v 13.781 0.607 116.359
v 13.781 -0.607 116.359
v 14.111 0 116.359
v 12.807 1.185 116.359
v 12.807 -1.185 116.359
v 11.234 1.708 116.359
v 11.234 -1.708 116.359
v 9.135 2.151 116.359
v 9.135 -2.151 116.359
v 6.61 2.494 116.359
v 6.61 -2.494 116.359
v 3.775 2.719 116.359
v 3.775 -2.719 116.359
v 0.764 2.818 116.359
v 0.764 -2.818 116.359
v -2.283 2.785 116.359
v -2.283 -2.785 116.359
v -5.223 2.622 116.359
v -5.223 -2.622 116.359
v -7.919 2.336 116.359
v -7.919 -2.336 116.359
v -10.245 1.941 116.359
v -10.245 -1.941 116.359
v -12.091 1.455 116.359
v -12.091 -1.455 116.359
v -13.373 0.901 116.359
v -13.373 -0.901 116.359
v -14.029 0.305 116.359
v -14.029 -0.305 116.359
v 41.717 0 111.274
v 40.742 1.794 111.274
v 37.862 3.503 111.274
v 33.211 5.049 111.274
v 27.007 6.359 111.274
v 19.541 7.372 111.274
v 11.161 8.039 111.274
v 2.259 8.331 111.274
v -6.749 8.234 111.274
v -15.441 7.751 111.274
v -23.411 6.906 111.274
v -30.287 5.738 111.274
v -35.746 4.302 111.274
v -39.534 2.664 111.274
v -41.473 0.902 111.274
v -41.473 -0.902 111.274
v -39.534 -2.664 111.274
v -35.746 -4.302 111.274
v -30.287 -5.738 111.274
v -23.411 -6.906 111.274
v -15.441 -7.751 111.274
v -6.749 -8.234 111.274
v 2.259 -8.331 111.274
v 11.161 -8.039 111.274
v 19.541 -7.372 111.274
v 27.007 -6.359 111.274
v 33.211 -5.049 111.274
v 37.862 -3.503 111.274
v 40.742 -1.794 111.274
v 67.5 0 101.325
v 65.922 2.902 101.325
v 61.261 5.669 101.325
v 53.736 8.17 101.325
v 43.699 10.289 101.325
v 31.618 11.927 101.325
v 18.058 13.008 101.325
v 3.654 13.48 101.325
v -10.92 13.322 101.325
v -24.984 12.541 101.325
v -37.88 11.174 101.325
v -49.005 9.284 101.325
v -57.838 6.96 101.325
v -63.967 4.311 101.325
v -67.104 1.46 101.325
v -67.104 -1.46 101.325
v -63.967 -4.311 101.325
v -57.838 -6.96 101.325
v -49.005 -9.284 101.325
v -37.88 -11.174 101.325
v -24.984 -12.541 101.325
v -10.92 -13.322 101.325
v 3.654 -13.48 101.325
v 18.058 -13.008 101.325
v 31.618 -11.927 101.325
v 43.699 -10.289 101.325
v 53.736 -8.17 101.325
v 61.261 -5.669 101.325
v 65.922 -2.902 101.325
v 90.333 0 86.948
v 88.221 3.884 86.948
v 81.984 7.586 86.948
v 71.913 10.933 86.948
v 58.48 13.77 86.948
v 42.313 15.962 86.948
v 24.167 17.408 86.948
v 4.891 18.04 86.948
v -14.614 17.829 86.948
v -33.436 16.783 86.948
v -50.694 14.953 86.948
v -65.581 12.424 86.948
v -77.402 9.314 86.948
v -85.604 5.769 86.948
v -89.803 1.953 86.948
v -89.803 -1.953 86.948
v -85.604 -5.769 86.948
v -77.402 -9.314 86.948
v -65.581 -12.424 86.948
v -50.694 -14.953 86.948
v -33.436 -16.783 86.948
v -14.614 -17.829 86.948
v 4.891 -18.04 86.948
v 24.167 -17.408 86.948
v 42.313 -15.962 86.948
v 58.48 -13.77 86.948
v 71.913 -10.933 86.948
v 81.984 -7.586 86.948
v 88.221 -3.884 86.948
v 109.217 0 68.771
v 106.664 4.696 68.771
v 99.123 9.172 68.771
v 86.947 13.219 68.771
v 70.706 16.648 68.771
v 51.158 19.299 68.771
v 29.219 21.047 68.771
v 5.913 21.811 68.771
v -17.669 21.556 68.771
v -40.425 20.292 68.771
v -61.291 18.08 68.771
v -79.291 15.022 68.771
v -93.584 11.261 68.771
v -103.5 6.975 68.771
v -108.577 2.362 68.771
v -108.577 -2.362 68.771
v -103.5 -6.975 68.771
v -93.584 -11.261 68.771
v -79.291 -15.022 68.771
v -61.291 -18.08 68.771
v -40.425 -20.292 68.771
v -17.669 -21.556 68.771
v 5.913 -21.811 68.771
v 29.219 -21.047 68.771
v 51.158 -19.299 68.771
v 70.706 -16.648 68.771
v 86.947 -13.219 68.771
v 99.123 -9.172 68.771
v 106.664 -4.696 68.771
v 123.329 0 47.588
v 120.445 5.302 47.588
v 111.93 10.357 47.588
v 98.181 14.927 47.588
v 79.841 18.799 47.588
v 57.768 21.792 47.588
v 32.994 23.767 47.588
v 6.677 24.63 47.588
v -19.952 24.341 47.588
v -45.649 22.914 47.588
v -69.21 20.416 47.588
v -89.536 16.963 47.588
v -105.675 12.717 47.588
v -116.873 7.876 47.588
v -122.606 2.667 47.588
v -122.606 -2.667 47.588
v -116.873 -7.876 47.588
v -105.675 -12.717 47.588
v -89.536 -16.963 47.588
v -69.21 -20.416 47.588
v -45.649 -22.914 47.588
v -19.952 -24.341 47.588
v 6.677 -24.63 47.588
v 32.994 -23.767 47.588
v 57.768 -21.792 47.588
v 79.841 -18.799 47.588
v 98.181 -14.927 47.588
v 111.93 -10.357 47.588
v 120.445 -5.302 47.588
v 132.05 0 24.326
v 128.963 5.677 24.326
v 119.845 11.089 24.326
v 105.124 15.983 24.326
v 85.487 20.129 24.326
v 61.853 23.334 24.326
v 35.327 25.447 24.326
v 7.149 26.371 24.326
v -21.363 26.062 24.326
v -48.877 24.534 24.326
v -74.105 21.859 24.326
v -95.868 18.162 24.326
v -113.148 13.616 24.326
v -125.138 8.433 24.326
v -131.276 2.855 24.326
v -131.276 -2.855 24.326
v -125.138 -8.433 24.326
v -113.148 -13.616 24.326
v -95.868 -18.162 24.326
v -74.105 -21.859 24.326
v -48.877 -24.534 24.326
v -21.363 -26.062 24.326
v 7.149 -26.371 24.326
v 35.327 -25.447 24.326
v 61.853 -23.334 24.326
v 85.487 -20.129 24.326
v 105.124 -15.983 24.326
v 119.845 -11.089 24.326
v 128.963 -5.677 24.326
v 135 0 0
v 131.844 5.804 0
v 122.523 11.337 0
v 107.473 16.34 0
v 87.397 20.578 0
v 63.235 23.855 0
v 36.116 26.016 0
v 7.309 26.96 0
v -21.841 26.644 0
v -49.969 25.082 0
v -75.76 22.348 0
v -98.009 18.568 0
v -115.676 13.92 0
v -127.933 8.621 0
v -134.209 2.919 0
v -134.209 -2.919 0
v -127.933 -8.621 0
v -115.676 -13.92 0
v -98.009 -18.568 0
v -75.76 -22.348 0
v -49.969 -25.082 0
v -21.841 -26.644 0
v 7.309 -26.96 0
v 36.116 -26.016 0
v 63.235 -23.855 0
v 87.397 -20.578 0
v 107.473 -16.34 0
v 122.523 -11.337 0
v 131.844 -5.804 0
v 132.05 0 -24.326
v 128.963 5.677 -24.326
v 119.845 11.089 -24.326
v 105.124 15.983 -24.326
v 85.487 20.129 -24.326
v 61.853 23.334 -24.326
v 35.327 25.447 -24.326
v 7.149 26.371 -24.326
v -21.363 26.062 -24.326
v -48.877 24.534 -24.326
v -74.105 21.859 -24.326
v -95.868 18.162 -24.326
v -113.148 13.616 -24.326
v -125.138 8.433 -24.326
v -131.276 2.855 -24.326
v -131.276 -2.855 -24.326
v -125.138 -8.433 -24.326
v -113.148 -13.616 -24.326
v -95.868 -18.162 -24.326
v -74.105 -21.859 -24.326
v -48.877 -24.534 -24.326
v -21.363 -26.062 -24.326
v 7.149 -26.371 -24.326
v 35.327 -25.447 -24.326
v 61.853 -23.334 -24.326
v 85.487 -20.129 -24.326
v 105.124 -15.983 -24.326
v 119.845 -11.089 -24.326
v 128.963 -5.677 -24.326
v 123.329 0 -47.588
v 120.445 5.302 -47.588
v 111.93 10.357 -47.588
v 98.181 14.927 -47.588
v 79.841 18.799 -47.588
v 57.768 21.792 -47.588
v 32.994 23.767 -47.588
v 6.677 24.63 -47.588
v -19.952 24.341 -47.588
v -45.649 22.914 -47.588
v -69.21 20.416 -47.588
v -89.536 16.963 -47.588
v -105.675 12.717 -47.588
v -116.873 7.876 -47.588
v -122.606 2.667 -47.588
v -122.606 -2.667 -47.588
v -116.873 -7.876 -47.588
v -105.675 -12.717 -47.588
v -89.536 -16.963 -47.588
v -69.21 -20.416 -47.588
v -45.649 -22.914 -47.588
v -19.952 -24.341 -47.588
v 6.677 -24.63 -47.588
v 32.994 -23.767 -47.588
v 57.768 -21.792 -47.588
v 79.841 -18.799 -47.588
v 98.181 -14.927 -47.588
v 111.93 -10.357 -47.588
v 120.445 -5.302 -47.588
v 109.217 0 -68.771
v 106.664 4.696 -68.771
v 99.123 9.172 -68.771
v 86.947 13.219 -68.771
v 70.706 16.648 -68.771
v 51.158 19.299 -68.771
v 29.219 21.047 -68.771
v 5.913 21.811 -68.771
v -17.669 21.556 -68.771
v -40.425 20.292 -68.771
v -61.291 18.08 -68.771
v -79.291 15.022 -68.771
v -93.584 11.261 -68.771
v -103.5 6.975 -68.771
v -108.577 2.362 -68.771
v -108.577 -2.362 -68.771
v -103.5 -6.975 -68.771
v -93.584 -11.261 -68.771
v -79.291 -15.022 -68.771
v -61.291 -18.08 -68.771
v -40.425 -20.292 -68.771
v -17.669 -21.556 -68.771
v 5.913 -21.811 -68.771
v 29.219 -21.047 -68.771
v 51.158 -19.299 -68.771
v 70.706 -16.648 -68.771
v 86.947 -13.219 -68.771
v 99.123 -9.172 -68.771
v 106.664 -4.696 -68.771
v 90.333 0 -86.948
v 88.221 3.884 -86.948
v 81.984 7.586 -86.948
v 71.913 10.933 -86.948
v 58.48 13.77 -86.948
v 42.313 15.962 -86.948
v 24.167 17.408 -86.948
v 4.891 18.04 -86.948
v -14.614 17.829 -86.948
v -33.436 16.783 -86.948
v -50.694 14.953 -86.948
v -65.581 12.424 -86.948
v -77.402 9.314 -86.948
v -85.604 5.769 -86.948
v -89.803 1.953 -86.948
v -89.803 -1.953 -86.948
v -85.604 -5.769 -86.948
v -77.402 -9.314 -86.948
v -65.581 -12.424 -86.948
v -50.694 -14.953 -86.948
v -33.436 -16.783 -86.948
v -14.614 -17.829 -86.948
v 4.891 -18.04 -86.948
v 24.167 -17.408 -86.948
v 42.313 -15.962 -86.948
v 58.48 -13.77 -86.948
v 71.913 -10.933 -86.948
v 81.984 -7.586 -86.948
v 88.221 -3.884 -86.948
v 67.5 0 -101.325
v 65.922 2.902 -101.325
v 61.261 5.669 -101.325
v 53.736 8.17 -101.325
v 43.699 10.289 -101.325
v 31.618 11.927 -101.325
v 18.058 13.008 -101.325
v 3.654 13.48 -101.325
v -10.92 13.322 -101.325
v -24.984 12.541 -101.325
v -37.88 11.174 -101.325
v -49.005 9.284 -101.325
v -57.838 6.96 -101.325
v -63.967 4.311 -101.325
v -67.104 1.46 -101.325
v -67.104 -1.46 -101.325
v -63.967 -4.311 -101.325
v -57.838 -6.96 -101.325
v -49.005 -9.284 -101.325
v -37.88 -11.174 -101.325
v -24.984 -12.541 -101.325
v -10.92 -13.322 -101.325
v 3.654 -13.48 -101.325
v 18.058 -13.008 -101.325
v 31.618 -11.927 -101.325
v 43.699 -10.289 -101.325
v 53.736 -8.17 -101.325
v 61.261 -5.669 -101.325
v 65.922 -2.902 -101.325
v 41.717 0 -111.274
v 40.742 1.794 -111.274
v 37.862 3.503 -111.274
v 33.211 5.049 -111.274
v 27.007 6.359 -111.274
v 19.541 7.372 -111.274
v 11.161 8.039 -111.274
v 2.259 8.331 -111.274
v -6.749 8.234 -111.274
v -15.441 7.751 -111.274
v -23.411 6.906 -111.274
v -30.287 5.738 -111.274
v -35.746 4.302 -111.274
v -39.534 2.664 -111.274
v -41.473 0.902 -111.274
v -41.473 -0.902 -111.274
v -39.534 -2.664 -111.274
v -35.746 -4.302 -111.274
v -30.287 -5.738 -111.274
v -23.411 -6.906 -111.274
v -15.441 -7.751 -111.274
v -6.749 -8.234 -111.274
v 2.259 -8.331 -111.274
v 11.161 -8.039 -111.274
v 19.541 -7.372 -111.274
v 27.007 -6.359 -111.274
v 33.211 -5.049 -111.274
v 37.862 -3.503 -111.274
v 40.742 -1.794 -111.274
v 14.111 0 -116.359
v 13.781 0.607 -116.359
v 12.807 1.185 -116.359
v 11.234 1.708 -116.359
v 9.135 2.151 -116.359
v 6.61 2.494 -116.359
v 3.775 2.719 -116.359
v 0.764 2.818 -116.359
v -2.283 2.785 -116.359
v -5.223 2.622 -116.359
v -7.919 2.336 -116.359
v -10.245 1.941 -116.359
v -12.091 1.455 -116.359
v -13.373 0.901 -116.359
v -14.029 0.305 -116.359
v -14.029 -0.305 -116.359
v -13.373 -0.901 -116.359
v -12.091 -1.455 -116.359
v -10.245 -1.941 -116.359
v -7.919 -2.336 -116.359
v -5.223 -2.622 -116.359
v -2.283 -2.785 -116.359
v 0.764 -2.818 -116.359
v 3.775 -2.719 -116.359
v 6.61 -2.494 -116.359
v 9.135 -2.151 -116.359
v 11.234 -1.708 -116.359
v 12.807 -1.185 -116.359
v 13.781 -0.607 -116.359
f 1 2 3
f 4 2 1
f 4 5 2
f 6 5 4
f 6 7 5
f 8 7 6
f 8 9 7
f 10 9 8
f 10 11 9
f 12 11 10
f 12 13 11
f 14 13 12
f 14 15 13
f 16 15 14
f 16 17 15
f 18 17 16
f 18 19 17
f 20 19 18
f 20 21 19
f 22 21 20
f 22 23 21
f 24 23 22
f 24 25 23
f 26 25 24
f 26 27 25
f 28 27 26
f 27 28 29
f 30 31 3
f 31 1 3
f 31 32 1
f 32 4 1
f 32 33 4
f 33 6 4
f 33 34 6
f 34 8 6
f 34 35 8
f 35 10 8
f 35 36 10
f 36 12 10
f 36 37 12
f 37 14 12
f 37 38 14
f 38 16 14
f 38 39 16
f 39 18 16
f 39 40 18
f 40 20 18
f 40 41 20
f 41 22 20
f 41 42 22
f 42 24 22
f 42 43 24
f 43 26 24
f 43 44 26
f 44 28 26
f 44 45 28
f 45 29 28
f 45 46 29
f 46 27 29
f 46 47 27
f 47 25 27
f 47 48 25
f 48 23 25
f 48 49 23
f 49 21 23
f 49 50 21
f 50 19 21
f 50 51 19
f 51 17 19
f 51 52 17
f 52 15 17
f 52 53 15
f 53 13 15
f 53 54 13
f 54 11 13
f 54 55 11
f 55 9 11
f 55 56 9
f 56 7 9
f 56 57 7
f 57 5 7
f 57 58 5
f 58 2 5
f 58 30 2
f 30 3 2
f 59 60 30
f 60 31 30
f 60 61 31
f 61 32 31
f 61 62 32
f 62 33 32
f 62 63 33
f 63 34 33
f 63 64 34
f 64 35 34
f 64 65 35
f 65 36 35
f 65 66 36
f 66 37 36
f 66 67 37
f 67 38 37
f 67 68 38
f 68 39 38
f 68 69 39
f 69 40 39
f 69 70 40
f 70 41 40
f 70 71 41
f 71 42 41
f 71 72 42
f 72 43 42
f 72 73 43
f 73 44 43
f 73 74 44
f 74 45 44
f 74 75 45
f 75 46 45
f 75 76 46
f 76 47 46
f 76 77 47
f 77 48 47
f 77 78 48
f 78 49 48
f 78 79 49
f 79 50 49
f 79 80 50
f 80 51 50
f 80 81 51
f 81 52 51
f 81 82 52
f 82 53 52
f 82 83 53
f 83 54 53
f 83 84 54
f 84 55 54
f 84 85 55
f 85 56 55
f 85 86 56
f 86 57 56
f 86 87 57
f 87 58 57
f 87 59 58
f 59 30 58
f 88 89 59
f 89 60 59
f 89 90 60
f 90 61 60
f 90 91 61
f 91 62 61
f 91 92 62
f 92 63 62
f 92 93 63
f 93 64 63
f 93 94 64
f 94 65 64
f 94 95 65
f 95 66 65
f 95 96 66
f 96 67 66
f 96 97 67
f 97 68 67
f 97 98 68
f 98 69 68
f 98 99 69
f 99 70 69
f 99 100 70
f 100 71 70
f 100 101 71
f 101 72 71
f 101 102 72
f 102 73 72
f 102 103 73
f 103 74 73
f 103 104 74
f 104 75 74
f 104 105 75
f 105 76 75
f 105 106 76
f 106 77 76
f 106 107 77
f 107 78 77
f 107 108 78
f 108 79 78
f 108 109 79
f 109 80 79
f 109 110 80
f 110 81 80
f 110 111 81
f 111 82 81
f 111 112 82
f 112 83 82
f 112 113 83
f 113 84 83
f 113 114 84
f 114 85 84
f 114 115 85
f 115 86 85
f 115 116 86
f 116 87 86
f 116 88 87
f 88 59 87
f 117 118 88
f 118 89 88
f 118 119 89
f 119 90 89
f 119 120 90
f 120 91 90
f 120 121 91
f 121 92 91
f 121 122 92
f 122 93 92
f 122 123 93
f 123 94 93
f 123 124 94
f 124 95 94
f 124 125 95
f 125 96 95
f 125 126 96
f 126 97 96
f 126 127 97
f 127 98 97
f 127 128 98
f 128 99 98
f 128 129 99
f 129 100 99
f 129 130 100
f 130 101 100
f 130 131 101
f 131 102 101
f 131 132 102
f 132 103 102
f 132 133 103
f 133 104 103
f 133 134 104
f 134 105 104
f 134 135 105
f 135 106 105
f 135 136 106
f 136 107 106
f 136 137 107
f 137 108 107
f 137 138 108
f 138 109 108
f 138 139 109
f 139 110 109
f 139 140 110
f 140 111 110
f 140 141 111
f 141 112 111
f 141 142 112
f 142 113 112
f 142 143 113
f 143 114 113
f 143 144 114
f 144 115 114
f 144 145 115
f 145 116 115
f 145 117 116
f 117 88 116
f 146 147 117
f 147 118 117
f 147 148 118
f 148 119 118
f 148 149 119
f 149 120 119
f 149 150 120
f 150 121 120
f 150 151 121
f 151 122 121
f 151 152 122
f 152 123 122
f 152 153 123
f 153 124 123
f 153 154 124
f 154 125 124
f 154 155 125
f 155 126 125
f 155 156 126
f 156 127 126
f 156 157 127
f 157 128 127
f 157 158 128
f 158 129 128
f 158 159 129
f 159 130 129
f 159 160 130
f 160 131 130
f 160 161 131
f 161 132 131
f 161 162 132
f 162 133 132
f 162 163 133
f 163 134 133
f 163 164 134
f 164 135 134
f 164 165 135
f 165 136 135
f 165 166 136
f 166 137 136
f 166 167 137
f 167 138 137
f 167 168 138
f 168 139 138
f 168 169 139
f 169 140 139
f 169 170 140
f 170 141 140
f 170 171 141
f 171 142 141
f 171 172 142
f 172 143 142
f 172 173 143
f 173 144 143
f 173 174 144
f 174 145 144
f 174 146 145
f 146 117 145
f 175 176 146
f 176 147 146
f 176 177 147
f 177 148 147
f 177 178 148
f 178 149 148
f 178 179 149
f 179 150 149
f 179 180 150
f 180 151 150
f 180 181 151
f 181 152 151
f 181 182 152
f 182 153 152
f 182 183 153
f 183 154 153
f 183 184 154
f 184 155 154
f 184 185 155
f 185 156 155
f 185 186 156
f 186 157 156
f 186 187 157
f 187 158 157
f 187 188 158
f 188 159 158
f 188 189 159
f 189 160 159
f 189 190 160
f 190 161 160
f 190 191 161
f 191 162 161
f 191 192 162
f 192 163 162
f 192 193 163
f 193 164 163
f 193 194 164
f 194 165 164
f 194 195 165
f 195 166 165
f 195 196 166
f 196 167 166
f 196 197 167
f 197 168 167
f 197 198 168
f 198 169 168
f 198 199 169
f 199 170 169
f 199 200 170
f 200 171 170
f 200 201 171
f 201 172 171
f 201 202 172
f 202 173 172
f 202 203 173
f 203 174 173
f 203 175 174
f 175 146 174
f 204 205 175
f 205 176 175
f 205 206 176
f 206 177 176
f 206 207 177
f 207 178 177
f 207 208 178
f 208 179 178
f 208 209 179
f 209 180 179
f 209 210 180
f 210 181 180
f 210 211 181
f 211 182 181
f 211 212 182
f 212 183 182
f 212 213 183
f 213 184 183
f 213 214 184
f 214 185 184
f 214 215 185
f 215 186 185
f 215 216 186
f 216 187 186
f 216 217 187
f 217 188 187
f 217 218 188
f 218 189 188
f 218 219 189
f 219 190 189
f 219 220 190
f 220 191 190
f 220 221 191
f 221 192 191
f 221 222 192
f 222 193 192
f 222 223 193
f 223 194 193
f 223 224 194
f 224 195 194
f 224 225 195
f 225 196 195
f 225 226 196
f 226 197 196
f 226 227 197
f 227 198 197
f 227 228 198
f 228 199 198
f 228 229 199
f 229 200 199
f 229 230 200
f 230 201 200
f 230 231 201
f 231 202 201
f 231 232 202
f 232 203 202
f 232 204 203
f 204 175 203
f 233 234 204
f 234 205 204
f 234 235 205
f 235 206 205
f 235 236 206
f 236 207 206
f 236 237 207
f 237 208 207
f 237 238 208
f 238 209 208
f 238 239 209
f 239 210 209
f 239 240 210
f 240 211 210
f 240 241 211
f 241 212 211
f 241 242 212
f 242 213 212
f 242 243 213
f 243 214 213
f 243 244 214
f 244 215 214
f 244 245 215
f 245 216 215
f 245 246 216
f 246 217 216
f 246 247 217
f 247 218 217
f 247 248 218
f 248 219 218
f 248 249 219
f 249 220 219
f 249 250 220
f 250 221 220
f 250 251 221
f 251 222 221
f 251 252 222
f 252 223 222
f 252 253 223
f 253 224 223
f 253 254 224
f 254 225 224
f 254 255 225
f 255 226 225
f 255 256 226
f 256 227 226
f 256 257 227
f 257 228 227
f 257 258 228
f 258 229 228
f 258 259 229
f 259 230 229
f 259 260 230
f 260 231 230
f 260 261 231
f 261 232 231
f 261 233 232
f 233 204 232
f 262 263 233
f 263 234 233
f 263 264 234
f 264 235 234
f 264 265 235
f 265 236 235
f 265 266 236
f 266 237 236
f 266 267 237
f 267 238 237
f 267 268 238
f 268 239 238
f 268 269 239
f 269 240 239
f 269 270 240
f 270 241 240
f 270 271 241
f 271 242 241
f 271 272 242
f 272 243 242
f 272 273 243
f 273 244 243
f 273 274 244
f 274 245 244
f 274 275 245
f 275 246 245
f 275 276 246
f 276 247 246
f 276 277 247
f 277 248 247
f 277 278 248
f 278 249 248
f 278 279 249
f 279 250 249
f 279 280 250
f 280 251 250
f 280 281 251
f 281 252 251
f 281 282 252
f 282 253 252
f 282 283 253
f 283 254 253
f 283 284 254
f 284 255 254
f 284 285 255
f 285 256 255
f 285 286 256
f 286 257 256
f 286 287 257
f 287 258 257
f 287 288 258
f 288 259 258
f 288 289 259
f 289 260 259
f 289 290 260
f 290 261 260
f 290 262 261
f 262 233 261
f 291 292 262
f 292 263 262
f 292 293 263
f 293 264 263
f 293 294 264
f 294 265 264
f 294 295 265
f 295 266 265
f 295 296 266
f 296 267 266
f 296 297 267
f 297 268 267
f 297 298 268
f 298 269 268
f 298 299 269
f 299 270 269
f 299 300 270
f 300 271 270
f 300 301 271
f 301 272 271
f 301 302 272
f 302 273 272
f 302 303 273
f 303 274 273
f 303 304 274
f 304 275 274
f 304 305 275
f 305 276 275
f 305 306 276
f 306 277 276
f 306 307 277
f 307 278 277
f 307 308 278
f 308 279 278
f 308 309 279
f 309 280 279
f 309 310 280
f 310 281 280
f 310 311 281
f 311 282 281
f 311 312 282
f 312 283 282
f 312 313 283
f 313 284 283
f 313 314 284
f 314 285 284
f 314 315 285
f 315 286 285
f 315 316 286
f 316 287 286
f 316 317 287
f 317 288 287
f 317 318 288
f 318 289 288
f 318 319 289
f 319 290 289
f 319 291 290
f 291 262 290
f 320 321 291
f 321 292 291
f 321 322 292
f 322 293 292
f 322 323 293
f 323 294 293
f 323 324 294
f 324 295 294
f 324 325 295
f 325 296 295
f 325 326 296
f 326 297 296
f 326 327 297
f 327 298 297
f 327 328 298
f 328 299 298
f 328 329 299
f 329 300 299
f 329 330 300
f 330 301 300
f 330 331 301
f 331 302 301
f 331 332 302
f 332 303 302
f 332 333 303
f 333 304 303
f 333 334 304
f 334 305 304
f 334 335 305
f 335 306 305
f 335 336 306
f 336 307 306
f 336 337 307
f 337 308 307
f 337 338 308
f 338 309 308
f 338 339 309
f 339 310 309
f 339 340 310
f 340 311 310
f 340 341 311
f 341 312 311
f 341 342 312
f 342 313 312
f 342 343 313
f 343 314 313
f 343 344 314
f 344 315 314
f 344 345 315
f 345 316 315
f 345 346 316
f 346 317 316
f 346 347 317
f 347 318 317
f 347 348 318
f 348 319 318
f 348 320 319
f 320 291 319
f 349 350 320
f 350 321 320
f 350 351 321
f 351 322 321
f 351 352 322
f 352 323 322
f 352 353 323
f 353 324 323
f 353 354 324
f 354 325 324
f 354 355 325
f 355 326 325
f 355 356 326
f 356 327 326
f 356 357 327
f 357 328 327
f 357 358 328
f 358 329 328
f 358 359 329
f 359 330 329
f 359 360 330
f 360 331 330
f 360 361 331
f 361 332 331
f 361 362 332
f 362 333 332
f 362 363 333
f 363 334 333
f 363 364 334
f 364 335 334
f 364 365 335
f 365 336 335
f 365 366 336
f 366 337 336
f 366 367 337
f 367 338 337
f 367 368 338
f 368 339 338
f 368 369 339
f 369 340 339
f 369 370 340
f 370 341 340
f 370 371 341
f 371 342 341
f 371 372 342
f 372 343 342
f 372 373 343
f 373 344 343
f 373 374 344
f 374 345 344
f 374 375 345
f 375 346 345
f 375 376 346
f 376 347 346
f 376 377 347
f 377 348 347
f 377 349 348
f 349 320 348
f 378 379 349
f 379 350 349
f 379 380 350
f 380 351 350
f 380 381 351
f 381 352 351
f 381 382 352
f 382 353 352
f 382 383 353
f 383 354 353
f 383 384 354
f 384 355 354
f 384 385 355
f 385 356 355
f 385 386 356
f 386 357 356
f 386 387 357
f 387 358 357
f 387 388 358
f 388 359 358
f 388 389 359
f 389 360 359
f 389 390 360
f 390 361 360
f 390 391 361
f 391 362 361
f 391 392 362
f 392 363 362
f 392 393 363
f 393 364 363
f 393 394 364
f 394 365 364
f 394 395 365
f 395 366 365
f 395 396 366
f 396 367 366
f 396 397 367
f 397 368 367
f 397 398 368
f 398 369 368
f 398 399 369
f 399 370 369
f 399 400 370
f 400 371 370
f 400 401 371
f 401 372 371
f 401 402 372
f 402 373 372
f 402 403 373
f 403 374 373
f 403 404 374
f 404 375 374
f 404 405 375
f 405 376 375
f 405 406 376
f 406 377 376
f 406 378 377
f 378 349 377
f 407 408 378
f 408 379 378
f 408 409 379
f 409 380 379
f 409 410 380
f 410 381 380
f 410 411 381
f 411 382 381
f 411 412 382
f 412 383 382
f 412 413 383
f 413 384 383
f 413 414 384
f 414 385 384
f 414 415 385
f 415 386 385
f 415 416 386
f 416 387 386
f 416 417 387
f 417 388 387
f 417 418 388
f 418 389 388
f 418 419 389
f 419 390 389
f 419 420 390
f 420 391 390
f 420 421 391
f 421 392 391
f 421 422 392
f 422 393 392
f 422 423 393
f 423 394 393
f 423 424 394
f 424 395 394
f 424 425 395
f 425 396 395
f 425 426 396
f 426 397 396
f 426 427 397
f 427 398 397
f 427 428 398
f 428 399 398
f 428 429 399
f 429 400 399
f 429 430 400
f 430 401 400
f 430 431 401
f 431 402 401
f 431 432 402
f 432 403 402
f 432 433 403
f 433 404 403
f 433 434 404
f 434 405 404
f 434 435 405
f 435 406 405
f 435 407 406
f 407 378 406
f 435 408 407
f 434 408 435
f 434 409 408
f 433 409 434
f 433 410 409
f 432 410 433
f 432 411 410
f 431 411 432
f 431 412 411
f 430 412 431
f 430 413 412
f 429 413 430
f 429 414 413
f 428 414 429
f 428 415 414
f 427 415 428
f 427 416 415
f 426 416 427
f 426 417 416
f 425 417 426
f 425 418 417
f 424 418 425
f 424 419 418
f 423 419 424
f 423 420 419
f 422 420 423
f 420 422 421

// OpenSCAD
// Generated by SolidPython 1.0.1 on 2020-07-29 00:46:51


scale(v = [15, 3, 13]) {
	sphere(r = 9);
}
/***********************************************
*********      SolidPython code:      **********
************************************************
 
# import packages: SolidPython
from solid import *
from solid.utils import *
from itertools import chain, combinations, permutations


class Resize:

    def __init__(self, scad_file):
        self.scad_file = scad_file
        #self.scad_file = import_scad(scad_file)
        # cone/cylinder param:
        self.r1 = 0
        self.r2 = 0
        self.h = 0
        # rectangular prism param:
        self.w = 0
        self.l = 0
        # ellipse param:
        self.r = 0

    # import OpenScad code (file name corresponds to shape)


    # classify shape + parameters
    def assign(self, param1, param2, param3):
        if self.scad_file == 'cone.scad':
            self.r1 = param1
            self.r2 = param2
            self.h = param3
        elif self.scad_file == 'cylinder.scad':
            self.r1 = param1
            self.r2 = param2
            self.h = param3
        elif self.scad_file == 'rectangularPrism.scad':
            self.h = param1
            self.l = param2
            self.w = param3
        else:
            self.r = param1
            self.h = param2

    # resize parameters
    def iterate(self):
        x = range(3, 20, 2)
        i = 1
        if self.scad_file == 'cone.scad':
            tempList = list(permutations(x, 2))
            for temp in tempList:
                param1 = temp[0]
                param2 = temp[1]
                filepath = 'produced_scad_files/' + 'cone' + str(param1) + '_' + str(param2) + '_' + '.scad'
                scad_render_to_file(cylinder(h=param1, r1=param2, r2=0), filepath)

        elif self.scad_file == 'cylinder.scad':
            tempList = list(permutations(x, 3))
            for temp in tempList:
                param1 = temp[0]
                param2 = temp[1]
                filepath = 'produced_scad_files/' + 'cylinder' + str(param1) + '_' + str(param2) + '_' + '.scad'
                scad_render_to_file(cylinder(h=param1, r1=param2, r2=param2), filepath)

        elif self.scad_file == 'rectangularPrism.scad':
            tempList = list(permutations(x, 3))
            for temp in tempList:
                param1 = temp[0]
                param2 = temp[1]
                param3 = temp[2]
                filepath = 'produced_scad_files/' + 'rectangularPrism' + str(param1) + '_' + str(param2) + '_' + str(
                    param3) + '.scad'
                scad_render_to_file(cube(size=(param1, param2, param3)), filepath)

        elif self.scad_file == 'ellipse.scad':
            tempList = list(permutations(x, 4))
            for temp in tempList:
                param1 = temp[0]
                param2 = temp[1]
                param3 = temp[2]
                param4 = temp[3]
                filepath = 'produced_scad_files/' + 'ellipse' + str(param1) + '_' + str(param2) + '_' + str(param3) + '_' + str(param4) + '.scad'
                scad_render_to_file(scale([param1, param2, param3])(sphere(r=param4)), filepath)

    def render_to_scadfile(self):
        scad_render_to_file(scad, 'example.scad') 
 
************************************************/
